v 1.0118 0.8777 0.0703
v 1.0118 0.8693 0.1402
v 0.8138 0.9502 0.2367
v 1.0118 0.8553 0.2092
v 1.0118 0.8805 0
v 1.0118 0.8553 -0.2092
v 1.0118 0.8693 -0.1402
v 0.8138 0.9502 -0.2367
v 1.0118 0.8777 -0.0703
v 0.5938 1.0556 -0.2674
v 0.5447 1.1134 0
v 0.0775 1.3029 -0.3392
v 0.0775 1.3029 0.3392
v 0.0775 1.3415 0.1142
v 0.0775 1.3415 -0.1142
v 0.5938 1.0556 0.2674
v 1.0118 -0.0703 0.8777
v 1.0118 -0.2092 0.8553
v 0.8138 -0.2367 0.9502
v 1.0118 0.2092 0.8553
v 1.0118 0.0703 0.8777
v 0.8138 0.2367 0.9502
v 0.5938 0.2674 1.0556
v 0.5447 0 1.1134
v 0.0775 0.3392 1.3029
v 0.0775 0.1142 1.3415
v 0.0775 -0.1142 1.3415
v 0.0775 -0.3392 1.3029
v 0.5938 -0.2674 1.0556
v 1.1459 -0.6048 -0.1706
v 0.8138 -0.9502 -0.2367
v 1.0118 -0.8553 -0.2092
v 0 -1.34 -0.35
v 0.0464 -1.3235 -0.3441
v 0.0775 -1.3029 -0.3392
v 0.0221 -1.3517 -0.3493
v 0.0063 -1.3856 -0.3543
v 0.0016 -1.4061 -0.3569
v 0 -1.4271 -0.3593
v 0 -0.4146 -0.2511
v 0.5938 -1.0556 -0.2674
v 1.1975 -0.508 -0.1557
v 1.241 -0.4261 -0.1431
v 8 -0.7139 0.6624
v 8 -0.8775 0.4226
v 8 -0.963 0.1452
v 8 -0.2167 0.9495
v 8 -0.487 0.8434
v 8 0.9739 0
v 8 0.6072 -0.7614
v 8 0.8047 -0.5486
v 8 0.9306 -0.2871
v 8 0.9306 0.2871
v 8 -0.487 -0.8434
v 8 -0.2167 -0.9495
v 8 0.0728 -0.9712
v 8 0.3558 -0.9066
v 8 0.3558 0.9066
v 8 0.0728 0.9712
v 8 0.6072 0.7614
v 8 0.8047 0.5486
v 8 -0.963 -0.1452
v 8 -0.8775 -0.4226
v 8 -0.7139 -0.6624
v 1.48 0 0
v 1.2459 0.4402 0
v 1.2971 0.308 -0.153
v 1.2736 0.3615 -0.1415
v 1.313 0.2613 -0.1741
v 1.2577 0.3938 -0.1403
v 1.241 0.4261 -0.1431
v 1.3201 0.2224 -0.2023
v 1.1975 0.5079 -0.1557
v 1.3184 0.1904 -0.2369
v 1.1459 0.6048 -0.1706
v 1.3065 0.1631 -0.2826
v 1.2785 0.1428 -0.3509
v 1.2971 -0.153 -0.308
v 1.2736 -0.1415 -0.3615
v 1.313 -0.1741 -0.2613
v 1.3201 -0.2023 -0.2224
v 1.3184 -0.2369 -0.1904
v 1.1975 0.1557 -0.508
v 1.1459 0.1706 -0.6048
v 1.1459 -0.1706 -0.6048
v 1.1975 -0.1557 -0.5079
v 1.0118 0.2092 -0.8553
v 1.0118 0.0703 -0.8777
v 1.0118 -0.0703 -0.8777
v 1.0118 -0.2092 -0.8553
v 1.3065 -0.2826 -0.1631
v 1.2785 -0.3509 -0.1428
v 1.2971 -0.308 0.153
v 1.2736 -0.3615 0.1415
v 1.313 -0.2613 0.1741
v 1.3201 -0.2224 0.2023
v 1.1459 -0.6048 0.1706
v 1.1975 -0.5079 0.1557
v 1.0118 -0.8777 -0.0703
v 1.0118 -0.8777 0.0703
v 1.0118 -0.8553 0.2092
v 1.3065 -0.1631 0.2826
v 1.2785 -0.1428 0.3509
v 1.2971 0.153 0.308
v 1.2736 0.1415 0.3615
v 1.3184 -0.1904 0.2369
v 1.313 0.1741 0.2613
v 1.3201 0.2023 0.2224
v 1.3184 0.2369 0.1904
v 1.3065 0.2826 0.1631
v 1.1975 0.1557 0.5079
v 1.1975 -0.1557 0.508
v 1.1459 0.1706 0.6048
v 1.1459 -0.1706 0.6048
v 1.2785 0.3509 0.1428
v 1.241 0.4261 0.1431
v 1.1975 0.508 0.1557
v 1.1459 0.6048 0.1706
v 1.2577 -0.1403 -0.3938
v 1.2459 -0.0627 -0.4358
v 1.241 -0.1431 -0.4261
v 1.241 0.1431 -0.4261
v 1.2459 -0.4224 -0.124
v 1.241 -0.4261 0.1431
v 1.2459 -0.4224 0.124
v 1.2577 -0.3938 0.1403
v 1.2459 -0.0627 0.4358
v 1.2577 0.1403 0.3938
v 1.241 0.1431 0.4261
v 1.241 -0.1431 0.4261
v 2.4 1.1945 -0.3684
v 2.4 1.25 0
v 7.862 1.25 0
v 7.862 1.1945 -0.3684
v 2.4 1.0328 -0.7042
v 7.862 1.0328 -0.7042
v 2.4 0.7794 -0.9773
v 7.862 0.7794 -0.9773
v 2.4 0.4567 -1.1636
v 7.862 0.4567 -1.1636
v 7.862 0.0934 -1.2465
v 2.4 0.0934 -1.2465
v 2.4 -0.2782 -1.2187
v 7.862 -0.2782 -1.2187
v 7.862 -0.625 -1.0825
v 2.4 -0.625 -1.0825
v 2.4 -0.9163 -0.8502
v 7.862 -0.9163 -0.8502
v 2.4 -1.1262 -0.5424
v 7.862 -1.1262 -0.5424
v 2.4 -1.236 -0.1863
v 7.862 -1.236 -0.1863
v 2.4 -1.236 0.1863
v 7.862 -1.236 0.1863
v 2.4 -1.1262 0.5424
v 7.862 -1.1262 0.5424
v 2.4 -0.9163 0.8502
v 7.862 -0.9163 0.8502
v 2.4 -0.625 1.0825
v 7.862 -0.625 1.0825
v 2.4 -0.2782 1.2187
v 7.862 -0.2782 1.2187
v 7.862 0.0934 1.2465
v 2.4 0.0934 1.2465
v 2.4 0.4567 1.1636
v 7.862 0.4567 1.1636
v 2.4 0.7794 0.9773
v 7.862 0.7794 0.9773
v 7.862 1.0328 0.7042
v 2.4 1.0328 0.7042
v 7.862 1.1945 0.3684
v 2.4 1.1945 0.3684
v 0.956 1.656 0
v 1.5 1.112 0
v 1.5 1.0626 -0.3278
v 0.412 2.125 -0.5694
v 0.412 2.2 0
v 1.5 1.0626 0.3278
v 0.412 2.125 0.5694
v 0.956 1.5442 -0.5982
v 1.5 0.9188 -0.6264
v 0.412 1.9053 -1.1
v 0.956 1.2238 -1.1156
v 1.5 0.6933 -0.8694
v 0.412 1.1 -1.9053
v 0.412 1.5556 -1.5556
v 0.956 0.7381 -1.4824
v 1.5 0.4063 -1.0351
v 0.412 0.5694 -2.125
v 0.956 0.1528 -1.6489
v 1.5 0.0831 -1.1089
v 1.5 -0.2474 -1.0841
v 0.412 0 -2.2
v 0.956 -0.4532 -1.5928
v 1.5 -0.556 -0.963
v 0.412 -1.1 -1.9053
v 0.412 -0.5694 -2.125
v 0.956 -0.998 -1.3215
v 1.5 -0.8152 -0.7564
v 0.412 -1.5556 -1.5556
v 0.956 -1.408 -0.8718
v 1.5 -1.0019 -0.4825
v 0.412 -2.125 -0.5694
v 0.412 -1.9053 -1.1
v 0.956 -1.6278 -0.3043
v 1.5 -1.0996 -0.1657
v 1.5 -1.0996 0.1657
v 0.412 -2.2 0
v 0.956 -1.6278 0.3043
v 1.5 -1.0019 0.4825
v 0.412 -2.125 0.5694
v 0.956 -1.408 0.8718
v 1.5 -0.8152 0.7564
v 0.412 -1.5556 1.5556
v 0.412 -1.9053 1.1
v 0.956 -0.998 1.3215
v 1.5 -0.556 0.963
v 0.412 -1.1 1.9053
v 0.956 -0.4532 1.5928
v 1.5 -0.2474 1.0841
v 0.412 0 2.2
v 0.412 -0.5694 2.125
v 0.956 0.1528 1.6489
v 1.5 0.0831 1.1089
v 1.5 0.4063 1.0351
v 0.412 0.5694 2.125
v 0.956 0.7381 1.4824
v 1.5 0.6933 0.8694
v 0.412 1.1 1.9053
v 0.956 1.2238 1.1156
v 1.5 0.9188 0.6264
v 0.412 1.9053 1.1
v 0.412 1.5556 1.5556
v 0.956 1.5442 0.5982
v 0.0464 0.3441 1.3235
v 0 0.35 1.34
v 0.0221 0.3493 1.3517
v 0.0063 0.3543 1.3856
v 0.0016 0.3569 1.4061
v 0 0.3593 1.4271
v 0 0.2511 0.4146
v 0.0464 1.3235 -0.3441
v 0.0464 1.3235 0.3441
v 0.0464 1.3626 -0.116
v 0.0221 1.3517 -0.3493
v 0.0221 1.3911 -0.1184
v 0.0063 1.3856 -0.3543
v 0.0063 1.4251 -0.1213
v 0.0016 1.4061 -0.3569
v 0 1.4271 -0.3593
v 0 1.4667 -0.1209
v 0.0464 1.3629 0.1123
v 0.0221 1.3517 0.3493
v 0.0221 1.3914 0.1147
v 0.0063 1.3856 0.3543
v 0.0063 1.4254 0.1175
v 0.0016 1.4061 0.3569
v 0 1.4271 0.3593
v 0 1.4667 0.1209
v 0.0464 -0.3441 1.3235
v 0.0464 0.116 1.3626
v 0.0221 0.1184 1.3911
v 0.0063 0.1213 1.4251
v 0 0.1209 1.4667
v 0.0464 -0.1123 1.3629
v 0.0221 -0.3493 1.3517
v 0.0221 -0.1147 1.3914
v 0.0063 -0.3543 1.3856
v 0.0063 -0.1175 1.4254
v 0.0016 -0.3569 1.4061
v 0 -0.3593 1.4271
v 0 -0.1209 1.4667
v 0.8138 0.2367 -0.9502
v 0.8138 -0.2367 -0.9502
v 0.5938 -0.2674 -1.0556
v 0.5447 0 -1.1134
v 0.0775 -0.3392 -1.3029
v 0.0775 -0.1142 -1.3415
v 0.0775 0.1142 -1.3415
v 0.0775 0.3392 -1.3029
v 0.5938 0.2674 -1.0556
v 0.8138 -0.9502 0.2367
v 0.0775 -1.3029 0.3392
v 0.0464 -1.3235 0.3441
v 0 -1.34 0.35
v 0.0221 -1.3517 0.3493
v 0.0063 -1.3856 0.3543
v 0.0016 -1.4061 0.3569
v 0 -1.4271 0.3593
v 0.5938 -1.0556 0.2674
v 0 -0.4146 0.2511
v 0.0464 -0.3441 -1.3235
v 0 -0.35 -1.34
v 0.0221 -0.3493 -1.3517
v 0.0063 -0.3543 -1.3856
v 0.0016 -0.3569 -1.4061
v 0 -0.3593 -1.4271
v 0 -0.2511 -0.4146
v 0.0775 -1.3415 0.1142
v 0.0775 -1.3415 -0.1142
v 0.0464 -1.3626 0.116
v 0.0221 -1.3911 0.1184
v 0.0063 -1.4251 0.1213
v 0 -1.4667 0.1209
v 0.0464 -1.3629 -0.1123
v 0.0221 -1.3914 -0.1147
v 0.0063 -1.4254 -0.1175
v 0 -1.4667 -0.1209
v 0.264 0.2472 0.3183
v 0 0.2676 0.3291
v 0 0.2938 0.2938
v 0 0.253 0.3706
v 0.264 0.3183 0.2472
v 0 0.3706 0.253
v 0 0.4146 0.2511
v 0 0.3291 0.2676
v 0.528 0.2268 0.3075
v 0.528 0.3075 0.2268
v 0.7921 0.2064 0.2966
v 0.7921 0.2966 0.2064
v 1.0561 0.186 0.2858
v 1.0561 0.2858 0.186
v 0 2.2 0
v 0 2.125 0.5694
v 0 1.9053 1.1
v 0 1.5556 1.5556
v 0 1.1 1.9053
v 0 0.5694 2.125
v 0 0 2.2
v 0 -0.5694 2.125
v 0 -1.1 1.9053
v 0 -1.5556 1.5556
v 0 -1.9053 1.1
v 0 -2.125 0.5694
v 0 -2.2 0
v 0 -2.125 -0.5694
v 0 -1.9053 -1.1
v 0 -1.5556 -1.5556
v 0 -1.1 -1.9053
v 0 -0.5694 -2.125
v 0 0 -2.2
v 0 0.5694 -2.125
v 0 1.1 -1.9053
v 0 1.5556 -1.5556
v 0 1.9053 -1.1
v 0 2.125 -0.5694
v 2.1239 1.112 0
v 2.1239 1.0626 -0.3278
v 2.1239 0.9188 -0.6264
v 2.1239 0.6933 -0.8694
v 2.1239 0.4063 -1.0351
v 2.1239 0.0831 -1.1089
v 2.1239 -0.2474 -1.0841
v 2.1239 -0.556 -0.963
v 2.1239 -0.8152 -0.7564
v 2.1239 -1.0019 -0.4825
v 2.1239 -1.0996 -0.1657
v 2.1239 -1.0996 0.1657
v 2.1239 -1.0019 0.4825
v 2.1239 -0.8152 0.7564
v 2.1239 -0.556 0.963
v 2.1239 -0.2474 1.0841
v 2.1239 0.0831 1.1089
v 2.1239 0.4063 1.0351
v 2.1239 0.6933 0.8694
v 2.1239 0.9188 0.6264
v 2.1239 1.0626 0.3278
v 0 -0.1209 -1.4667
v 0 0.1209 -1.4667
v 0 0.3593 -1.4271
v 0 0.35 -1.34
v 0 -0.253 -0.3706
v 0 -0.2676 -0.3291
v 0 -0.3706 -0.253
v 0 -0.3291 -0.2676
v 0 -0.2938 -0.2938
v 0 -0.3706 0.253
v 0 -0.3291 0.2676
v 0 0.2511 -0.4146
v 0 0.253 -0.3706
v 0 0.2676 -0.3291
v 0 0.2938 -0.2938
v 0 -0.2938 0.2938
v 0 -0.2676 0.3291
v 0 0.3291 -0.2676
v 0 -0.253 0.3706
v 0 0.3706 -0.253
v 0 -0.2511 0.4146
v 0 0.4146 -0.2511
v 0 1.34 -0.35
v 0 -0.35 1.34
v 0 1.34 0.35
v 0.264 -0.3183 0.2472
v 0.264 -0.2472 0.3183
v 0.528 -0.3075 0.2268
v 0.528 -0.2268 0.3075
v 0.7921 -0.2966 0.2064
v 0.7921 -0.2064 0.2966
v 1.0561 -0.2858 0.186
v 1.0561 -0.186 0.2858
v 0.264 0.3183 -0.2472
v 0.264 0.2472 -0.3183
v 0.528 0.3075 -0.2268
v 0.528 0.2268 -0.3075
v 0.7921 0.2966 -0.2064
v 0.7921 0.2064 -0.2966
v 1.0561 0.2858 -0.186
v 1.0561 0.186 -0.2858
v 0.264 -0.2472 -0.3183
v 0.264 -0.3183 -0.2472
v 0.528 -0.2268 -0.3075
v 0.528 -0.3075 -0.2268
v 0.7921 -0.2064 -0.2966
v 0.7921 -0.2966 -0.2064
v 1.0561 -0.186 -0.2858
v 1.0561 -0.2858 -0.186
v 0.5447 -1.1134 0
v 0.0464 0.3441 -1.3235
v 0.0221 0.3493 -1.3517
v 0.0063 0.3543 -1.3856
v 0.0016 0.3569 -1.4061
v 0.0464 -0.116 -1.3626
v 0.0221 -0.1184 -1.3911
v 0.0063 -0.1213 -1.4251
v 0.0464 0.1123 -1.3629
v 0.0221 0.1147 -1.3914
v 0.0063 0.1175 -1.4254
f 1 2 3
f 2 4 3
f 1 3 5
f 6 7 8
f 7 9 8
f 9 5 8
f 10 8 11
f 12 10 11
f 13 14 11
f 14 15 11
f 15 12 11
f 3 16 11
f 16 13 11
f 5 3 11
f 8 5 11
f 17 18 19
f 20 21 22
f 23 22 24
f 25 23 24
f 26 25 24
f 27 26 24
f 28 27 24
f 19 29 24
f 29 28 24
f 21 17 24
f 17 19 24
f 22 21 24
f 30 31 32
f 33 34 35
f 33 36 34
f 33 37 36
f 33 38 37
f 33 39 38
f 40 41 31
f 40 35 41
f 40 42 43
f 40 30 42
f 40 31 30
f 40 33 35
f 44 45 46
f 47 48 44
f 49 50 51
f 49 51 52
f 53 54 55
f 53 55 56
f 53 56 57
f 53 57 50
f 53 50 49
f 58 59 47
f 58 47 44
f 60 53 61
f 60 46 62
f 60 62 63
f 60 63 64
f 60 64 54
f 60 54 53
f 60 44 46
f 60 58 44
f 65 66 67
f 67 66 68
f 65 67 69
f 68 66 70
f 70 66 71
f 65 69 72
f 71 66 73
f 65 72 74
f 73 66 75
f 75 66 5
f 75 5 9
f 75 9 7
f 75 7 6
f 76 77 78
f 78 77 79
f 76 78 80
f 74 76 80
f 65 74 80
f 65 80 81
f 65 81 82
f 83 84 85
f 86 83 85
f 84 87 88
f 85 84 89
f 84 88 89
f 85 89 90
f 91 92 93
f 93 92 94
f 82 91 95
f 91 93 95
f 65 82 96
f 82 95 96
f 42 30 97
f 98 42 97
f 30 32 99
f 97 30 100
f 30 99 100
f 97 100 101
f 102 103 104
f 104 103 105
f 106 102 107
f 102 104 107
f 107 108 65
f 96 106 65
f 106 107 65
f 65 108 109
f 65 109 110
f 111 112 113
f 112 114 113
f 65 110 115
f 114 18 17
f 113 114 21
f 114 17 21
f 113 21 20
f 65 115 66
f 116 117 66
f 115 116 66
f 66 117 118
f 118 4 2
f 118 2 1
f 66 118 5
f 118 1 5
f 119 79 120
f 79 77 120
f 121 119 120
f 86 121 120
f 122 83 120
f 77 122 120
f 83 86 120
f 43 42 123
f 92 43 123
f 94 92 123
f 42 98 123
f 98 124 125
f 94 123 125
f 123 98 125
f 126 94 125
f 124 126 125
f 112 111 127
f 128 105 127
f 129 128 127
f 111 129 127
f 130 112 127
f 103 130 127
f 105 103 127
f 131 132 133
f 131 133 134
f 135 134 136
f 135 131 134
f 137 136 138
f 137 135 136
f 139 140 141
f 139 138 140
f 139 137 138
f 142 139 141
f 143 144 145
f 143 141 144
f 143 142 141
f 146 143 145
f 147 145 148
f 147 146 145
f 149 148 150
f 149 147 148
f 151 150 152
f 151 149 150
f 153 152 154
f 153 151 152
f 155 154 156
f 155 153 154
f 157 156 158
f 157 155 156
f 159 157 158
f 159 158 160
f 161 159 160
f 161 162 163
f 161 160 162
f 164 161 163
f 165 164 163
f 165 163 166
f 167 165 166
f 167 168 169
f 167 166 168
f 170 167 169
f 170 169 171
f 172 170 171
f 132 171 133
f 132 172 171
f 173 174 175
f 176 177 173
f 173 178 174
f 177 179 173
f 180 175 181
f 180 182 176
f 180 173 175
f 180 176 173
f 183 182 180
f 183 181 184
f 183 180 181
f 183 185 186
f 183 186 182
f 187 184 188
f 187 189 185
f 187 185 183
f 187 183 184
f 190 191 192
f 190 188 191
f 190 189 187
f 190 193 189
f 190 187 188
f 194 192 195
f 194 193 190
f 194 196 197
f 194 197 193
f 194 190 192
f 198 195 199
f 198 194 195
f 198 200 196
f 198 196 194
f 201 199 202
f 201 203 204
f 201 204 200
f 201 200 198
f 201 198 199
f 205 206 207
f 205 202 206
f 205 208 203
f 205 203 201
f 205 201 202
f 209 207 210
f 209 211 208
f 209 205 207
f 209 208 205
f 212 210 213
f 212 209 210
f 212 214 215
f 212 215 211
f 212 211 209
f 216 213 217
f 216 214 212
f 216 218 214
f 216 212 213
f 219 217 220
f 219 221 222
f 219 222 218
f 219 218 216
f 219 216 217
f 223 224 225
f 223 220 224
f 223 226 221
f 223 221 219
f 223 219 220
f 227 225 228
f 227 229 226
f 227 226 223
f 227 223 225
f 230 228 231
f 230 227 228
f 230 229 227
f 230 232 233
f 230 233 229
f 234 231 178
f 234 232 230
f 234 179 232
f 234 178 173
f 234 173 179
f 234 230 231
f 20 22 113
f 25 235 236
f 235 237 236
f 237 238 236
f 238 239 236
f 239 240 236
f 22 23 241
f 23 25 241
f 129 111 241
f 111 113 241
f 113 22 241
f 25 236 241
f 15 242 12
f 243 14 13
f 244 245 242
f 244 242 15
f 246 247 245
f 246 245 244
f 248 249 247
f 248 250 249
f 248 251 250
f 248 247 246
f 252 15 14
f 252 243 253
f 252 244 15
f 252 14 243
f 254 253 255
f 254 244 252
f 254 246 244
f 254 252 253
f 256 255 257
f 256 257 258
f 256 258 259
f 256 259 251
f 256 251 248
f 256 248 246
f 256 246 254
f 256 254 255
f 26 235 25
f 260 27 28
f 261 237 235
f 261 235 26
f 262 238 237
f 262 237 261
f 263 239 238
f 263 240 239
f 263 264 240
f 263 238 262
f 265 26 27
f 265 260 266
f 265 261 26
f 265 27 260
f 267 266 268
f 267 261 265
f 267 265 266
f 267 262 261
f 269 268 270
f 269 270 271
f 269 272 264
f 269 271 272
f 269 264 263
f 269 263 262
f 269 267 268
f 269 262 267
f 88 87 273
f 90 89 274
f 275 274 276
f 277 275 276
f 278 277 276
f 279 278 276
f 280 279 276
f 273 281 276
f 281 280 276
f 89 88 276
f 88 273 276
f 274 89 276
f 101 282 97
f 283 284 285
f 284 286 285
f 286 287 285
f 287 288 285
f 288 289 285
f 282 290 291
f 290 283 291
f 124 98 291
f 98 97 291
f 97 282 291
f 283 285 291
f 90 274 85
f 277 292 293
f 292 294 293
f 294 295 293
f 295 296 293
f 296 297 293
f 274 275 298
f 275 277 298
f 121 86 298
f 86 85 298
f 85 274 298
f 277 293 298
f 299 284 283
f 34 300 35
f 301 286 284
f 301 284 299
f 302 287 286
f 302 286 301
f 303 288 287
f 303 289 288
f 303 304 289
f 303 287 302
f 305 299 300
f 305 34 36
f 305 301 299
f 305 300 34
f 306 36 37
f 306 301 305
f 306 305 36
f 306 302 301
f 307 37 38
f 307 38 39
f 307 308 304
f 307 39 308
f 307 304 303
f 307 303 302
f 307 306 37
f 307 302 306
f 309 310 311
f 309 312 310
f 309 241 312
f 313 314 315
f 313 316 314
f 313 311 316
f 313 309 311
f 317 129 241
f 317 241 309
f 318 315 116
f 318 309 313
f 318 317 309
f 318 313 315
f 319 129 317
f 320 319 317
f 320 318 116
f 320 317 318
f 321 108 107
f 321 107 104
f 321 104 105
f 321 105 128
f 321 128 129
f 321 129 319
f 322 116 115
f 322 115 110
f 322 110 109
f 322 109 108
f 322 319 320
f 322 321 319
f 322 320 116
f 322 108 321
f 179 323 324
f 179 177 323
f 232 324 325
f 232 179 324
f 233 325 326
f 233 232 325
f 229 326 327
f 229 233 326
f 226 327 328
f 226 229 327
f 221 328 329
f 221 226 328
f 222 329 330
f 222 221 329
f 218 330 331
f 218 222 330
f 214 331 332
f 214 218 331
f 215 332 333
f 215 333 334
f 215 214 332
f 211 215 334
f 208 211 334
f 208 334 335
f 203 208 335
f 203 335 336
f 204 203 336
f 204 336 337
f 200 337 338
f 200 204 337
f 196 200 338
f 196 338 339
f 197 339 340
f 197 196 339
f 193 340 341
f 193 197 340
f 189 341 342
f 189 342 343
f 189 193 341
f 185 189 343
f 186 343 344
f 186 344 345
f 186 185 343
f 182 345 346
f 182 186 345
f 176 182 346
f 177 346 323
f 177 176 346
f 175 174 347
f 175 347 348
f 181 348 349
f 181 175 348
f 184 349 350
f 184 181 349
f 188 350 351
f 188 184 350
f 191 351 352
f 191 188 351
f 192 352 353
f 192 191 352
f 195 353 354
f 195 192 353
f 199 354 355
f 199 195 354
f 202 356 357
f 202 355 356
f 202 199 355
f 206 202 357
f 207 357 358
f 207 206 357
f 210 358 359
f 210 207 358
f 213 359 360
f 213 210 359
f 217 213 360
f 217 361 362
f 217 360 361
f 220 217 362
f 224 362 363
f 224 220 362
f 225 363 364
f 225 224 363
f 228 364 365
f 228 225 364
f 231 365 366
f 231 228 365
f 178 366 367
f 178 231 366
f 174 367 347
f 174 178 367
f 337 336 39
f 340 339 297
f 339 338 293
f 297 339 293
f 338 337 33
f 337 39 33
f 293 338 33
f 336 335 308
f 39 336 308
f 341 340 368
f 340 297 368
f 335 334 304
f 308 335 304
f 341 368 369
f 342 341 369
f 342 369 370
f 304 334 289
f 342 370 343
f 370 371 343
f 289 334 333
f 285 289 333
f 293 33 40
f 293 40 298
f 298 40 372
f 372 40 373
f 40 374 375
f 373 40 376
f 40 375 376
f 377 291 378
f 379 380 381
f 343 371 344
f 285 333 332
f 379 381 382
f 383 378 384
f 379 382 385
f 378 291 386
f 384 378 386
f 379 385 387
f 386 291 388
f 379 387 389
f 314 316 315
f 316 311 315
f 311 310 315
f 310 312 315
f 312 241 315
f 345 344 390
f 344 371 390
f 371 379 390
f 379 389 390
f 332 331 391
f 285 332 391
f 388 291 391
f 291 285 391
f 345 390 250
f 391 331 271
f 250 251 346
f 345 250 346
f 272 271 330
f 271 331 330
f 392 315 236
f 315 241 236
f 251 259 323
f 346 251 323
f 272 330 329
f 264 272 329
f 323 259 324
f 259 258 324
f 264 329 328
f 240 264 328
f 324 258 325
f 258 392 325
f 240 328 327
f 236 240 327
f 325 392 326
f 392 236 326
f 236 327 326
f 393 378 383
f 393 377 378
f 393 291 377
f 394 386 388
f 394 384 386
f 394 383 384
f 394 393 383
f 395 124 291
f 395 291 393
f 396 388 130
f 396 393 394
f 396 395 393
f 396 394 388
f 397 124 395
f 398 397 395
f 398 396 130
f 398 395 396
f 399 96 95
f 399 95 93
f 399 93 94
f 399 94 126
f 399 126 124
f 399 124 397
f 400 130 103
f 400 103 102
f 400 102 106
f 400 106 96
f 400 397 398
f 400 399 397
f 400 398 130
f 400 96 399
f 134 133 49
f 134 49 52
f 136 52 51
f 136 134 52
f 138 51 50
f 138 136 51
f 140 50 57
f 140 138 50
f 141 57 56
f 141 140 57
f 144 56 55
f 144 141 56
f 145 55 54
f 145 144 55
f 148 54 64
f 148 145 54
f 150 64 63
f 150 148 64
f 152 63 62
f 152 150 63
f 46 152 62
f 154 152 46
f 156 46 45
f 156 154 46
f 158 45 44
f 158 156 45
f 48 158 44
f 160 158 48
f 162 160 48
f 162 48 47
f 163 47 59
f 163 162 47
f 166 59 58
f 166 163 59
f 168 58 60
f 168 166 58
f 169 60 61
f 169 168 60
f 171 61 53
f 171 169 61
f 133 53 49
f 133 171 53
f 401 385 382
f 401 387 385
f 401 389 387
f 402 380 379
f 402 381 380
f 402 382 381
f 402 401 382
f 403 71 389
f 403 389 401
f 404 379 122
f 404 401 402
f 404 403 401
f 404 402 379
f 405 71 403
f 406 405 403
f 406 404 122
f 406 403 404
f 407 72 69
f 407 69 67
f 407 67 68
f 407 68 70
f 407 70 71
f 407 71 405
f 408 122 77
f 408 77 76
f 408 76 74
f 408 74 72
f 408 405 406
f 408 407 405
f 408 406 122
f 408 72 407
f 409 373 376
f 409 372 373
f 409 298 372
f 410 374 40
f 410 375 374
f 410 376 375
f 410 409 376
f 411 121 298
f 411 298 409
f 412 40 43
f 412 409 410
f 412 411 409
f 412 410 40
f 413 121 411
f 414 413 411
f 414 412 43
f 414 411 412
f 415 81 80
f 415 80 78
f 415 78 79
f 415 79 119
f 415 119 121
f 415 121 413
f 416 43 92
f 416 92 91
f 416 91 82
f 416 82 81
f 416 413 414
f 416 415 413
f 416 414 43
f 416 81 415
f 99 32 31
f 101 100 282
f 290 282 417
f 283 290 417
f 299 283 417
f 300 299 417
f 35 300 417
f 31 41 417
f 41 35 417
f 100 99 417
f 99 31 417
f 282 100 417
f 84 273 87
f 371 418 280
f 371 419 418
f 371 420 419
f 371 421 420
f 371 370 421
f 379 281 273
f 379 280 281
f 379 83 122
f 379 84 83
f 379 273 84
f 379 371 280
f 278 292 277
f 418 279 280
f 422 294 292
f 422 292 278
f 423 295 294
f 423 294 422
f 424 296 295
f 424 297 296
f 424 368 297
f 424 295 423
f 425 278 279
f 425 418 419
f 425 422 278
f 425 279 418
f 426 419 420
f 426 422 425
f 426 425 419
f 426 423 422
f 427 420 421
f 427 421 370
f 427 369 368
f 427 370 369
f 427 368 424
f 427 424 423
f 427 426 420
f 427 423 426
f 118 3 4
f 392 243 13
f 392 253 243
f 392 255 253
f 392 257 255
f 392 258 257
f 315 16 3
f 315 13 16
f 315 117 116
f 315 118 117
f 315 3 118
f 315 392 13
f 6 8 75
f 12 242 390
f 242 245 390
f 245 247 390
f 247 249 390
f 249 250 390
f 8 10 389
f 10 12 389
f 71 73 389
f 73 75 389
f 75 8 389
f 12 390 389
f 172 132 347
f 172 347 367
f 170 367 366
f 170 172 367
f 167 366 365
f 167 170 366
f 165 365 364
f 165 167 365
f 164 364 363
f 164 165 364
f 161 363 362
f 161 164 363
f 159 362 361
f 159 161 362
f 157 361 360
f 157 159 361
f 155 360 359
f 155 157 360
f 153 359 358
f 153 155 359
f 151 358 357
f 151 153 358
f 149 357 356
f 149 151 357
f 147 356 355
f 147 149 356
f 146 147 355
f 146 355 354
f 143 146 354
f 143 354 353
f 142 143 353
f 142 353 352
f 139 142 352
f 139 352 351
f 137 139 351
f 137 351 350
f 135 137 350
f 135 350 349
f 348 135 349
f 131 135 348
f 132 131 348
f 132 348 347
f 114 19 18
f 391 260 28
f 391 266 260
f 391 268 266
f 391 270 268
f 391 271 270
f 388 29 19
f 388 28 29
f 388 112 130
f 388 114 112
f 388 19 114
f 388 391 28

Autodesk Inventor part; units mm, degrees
ref_plane "YZ Plane" through (0, 0, 0) normal (1, 0, 0) x (0, 1, 0)
ref_plane "XZ Plane" through (0, 0, 0) normal (0, 1, 0) x (-1, 0, 0)
sketch "Szkic1" plane through (0, 0, 0) normal (0, 0, 1) x (1, 0, 0)
  line L0 (1.48, 0) -> (8, 0)
  line L1 (8, 0) -> (8, 1.25)
  line L2 (8, 1.25) -> (2.4, 1.25)
  line L3 (2.4, 1.25) -> (2.1239, 1.112)
  line L4 (2.1239, 1.112) -> (1.5, 1.112)
  line L5 (0, 2.2) -> (0, 1.385)
  line L6 (0, 1.385) -> (1.0118, 0.8805)
  line L7 (1.0118, 0.8805) -> (1.48, 0)
  line L8 (-1.6, 0) -> (9.6, 0) projected
  line L9 (0, -0.44) -> (0, 2.64) projected
  line L10 (0, 2.2) -> (0.412, 2.2)
  line L11 (0.412, 2.2) -> (1.5, 1.112)
  line L12 (2.4, 1.25) -> (1.362, 1.25) construction
  dimension "d1" = 5.6
  dimension "d2" = 2.5
  dimension "d3" = 2.2239
  dimension "d4" = 2.77
  dimension "d5" = 26.5
  dimension "d6" = 62
  dimension "d7" = 1.48
  dimension "d8" = 0.2761
  dimension "d12" = 4.4
  dimension "d13" = 45
  dimension "d15" = 8
  dimension "d24" = 1.5
revolve "Bryła" add sketch "Szkic1" angle 360 about axis through (1.48, 0, 0) along (1, 0, 0) contours L7 L6 L5 L10 L11 L4 L3 L2 L1 L0
sketch "Szkic2" plane through (0, 0, 0) normal (-1, 0, 0) x (0, 0, 1)
  line L0 (0, 1.385) -> (0, 0) construction
  line L1 (0, 0) -> (1.385, 0) construction
  arc A0 (0.4155, 0) -> (0, 0.4155) centre (0, 0) ccw construction
  arc A1 (0.4848, 0) -> (0, 0.4848) centre (0, 0) ccw construction
  arc A2 (1.34, 0.35) -> (0.35, 1.34) centre (0, 0) ccw
  line L2 (0, 0) -> (0.9793, 0.9793) construction
  line L3 (0.35, 1.34) -> (0.2511, 0.4146)
  line L4 (1.34, 0.35) -> (0.4146, 0.2511)
  arc A3 (0.35, 1.34) -> (0, 1.385) centre (0, 0) ccw
  arc A4 (1.385, 0) -> (1.34, 0.35) centre (0, 0) ccw
  line L5 (0, -3.08) -> (0, 3.08) projected
  line L6 (-3.08, 0) -> (3.08, 0) projected
  arc A5 (0.35, -1.34) -> (1.34, -0.35) centre (0, 0) ccw
  line L7 (0.35, -1.34) -> (0.2511, -0.4146)
  line L8 (1.34, -0.35) -> (0.4146, -0.2511)
  arc A6 (0, -1.385) -> (0.35, -1.34) centre (0, 0) ccw
  arc A7 (1.34, -0.35) -> (1.385, 0) centre (0, 0) ccw
  arc A8 (-0.35, 1.34) -> (-1.34, 0.35) centre (0, 0) ccw
  line L9 (-0.35, 1.34) -> (-0.2511, 0.4146)
  line L10 (-1.34, 0.35) -> (-0.4146, 0.2511)
  arc A9 (0, 1.385) -> (-0.35, 1.34) centre (0, 0) ccw
  arc A10 (-1.34, 0.35) -> (-1.385, 0) centre (0, 0) ccw
  arc A11 (-0.35, -1.34) -> (0, -1.385) centre (0, 0) ccw
  arc A12 (-1.34, -0.35) -> (-0.35, -1.34) centre (0, 0) ccw
  arc A13 (-1.385, 0) -> (-1.34, -0.35) centre (0, 0) ccw
  line L11 (-1.34, -0.35) -> (-0.4146, -0.2511)
  line L12 (-0.35, -1.34) -> (-0.2511, -0.4146)
  arc A14 (0.2511, 0.4146) -> (0.4146, 0.2511) centre (0.3988, 0.3988) ccw
  arc A15 (0.4146, -0.2511) -> (0.2511, -0.4146) centre (0.3988, -0.3988) ccw
  arc A16 (-0.4146, 0.2511) -> (-0.2511, 0.4146) centre (-0.3988, 0.3988) ccw
  arc A17 (-0.2511, -0.4146) -> (-0.4146, -0.2511) centre (-0.3988, -0.3988) ccw
  point P0 (0.9793, -0.9793)
  point P1 (-0.9793, 0.9793)
  point P2 (-0.9793, -0.9793)
  dimension "d17" = 0.831
  dimension "d18" = 0.9695
  dimension "d19" = 2.77
  dimension "d20" = 45
  dimension "d21" = 0.35
extrude "Szczelina" add sketch "Szkic2" against normal up to next draft 5 contours L4 A14 L3 A2 | A5 L7 A15 L8 | L9 A16 L10 A8 | A12 L11 A17 L12
fillet "Zaokrąglenie1" radius 0.14 4 edges at (0, 1.385, 0) (0, 0, -1.385) (0, -1.385, 0) (0, 0, 1.385)
thread "Gwint" size "M2.5x0.45" class "6g" standard "ISO Metric profile" length 5.6
chamfer "Faza1" distance 0.2761 distance2 0.138 1 edges at (8, -1.25, 0) measured on face at (8, -0.3689, 0.1936)
ref_plane "Work Plane2" through (3.35, 0, 0) normal (0, 0, -1) x (1, 0, 0)
equation "\"d1\" = GEL"
equation "\"d2\" = GD"
equation "\"d3\" = BDM"
equation "\"d4\" = SDM"
equation "\"d7\" = INTI"
equation "\"d8\" = GAL"
equation "\"d12\" = KOD"
equation "\"d13\" = 0.5 * SEWI"
equation "\"d15\" = NLG"
equation "\"d24\" = KOH"
equation "\"d17\" = 0.3 * SDM"
equation "\"d18\" = 0.35 * SDM"
equation "\"d19\" = SDM"
equation "\"d21\" = 0.5 * SBR"
equation "\"d23\" = 0.2 * SBR"
equation "\"d10\" = GEL"
equation "\"d25\" = -0.5 * SPD + 0.5 * GD"
equation "\"d26\" = 0.5 * GAL"
equation "\"NLG\" = 8"
equation "\"GEL\" = 5.6"
equation "\"GAL\" = 0.61345 * PTC"
equation "\"SPD\" = NND - 1.2269 * PTC"
equation "\"KOD\" = 4.4"
equation "\"KOH\" = 1.5"
equation "\"SBR\" = 0.7"
equation "\"INTI\" = 1.48"
equation "\"SDM\" = 2.77"
equation "\"GD\" = NND"
equation "\"BDM\" = NND - GAL"
equation "\"SEWI\" = 90deg"
equation "\"d9\" = SDM"
equation "\"GUL\" = 0.61345 * PTC"
equation "\"TOA\" = 30deg"
equation "\"EPV\" = 2.75"
equation "\"THREADDIA\" = 2.5"
equation "\"RR\" = 0.3"
equation "\"PTC\" = 0.45"
equation "\"NND\" = 2.5"
equation "\"GD1\" = THREADDIA - 1.2269 * PTC"
properties part number "AS 1427 - M2,5 x 8" material "Stal, miękka"
